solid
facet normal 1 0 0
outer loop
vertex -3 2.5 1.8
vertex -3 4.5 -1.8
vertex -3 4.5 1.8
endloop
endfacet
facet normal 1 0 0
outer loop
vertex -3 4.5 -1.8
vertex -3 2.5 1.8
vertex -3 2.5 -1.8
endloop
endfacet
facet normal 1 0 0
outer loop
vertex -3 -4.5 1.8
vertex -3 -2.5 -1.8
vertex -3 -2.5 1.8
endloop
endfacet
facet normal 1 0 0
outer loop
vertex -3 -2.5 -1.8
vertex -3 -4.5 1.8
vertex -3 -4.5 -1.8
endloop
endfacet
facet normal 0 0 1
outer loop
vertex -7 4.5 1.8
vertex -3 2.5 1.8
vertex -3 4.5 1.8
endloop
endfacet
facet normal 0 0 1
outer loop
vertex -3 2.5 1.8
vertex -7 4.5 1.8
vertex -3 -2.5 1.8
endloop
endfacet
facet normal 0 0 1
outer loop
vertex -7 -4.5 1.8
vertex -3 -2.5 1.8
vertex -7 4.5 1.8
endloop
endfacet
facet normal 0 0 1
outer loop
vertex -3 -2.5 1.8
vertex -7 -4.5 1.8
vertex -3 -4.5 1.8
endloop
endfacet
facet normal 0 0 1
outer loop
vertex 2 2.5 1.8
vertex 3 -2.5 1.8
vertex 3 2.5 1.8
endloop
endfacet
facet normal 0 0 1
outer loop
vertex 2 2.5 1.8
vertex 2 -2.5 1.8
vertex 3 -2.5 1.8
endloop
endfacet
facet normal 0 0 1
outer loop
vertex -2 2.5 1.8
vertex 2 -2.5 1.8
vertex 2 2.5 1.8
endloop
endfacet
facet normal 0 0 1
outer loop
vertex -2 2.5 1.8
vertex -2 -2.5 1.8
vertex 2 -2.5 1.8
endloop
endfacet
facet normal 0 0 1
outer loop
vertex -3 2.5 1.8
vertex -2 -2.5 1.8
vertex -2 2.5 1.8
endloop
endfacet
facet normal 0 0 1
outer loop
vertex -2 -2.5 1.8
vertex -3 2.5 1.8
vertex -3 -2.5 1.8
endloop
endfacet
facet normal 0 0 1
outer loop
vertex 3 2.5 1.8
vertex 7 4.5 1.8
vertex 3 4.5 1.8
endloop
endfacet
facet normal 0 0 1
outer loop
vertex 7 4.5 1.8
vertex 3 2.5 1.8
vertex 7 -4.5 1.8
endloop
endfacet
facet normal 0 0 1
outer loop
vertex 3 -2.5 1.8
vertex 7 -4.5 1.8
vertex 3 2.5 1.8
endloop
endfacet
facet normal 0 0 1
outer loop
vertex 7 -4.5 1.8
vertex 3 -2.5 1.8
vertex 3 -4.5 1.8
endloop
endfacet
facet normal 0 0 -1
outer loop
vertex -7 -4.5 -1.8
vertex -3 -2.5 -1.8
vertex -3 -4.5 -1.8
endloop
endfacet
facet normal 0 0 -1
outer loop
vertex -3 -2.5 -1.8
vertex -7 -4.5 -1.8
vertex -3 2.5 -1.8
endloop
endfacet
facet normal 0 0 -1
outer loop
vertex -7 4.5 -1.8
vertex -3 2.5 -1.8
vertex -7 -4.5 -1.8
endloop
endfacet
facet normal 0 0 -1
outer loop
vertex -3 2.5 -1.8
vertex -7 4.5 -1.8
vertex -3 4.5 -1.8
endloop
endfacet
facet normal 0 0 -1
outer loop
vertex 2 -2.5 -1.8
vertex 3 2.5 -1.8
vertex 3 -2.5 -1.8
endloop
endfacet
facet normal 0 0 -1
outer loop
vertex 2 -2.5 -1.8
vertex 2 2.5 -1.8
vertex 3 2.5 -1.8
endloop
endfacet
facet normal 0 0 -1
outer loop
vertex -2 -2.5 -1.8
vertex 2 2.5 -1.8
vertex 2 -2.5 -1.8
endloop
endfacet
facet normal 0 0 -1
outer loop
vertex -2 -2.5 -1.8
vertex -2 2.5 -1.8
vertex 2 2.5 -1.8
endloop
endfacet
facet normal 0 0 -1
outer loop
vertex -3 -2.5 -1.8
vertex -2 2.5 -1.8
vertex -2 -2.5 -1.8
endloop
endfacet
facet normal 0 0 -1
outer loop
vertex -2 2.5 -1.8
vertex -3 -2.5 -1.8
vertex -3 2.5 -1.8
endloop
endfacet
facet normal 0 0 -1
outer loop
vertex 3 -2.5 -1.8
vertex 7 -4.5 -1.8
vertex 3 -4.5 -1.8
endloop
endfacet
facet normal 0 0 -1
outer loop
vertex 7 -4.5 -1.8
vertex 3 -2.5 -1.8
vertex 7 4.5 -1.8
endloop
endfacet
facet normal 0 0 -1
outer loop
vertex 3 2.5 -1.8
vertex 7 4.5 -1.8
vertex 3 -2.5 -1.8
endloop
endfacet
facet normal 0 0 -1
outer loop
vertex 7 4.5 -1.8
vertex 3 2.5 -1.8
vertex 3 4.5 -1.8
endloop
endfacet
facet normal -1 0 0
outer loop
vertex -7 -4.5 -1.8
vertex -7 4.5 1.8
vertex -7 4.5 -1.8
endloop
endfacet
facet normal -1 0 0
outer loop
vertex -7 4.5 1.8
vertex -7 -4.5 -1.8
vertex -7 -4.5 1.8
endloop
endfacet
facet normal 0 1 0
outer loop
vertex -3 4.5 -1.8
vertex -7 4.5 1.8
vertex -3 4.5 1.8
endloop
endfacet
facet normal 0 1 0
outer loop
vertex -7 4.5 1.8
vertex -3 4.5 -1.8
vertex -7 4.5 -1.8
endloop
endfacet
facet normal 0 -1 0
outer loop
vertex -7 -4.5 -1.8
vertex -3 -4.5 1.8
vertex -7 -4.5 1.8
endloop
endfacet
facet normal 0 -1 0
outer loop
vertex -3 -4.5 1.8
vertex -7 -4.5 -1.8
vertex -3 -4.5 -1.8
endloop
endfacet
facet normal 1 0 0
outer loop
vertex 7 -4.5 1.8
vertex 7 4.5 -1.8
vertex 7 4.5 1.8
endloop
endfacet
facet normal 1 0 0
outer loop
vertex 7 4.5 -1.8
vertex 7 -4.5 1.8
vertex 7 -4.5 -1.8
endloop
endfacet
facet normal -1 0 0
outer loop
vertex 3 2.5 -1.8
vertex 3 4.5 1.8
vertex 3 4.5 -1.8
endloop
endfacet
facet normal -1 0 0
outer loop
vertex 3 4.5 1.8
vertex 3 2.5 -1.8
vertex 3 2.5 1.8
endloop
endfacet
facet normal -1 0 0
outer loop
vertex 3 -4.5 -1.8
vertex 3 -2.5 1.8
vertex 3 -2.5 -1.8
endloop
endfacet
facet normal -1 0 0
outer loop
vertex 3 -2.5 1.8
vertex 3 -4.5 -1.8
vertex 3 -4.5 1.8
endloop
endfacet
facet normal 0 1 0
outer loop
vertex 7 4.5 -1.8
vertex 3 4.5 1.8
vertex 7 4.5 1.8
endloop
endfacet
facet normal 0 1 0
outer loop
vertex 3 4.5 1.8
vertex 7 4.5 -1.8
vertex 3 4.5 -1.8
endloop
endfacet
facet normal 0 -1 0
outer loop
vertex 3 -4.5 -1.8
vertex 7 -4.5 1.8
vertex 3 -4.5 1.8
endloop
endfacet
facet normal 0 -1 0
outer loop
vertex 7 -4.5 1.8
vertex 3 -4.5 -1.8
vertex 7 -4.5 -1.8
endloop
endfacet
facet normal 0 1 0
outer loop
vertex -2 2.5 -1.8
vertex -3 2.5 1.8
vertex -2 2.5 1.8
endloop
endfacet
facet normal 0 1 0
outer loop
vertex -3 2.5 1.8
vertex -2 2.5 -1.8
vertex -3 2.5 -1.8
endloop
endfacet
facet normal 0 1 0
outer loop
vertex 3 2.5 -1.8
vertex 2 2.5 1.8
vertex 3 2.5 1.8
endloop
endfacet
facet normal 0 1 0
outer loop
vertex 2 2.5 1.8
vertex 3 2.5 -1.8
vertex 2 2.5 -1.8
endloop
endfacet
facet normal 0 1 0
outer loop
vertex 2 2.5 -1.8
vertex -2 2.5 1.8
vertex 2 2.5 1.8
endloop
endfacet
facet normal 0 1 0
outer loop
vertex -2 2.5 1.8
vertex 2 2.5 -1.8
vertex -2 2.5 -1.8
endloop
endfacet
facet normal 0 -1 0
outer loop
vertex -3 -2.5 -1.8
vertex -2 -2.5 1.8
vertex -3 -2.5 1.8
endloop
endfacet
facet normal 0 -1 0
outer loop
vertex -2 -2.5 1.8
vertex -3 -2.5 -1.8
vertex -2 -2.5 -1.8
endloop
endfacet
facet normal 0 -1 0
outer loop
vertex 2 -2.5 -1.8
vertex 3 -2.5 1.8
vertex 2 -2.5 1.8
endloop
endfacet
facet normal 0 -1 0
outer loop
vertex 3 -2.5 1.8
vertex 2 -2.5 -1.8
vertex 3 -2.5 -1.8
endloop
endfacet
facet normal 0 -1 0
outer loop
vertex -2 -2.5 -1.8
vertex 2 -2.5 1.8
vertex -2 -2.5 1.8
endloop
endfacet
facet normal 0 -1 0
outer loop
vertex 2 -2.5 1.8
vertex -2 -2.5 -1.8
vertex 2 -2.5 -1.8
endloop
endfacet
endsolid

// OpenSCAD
$fn=64;

L = 14.0;   // X
W = 9.0;    // Y
T = 3.6;    // Z

end_len = 4.0;      // length of each end mass along X
web_len = L - 2*end_len;

end_w = W;          // full width at ends
web_w = 5.0;        // narrower central web width (I-beam-like in left/right view)

notch_len = 4.0;    // relief length along X at midspan
notch_depth = 2.0;  // relief depth from top/bottom edges along Y
notch_z = T;        // through thickness

module base_shape() {
    union() {
        translate([-(L/2) + end_len/2, 0, 0]) cube([end_len, end_w, T], center=true);
        translate([(L/2) - end_len/2, 0, 0]) cube([end_len, end_w, T], center=true);
        cube([web_len, web_w, T], center=true);
    }
}

module reliefs() {
    union() {
        translate([0, (W/2) - (notch_depth/2), 0]) cube([notch_len, notch_depth, notch_z], center=true);
        translate([0, -(W/2) + (notch_depth/2), 0]) cube([notch_len, notch_depth, notch_z], center=true);
    }
}

difference() {
    base_shape();
    reliefs();
}
